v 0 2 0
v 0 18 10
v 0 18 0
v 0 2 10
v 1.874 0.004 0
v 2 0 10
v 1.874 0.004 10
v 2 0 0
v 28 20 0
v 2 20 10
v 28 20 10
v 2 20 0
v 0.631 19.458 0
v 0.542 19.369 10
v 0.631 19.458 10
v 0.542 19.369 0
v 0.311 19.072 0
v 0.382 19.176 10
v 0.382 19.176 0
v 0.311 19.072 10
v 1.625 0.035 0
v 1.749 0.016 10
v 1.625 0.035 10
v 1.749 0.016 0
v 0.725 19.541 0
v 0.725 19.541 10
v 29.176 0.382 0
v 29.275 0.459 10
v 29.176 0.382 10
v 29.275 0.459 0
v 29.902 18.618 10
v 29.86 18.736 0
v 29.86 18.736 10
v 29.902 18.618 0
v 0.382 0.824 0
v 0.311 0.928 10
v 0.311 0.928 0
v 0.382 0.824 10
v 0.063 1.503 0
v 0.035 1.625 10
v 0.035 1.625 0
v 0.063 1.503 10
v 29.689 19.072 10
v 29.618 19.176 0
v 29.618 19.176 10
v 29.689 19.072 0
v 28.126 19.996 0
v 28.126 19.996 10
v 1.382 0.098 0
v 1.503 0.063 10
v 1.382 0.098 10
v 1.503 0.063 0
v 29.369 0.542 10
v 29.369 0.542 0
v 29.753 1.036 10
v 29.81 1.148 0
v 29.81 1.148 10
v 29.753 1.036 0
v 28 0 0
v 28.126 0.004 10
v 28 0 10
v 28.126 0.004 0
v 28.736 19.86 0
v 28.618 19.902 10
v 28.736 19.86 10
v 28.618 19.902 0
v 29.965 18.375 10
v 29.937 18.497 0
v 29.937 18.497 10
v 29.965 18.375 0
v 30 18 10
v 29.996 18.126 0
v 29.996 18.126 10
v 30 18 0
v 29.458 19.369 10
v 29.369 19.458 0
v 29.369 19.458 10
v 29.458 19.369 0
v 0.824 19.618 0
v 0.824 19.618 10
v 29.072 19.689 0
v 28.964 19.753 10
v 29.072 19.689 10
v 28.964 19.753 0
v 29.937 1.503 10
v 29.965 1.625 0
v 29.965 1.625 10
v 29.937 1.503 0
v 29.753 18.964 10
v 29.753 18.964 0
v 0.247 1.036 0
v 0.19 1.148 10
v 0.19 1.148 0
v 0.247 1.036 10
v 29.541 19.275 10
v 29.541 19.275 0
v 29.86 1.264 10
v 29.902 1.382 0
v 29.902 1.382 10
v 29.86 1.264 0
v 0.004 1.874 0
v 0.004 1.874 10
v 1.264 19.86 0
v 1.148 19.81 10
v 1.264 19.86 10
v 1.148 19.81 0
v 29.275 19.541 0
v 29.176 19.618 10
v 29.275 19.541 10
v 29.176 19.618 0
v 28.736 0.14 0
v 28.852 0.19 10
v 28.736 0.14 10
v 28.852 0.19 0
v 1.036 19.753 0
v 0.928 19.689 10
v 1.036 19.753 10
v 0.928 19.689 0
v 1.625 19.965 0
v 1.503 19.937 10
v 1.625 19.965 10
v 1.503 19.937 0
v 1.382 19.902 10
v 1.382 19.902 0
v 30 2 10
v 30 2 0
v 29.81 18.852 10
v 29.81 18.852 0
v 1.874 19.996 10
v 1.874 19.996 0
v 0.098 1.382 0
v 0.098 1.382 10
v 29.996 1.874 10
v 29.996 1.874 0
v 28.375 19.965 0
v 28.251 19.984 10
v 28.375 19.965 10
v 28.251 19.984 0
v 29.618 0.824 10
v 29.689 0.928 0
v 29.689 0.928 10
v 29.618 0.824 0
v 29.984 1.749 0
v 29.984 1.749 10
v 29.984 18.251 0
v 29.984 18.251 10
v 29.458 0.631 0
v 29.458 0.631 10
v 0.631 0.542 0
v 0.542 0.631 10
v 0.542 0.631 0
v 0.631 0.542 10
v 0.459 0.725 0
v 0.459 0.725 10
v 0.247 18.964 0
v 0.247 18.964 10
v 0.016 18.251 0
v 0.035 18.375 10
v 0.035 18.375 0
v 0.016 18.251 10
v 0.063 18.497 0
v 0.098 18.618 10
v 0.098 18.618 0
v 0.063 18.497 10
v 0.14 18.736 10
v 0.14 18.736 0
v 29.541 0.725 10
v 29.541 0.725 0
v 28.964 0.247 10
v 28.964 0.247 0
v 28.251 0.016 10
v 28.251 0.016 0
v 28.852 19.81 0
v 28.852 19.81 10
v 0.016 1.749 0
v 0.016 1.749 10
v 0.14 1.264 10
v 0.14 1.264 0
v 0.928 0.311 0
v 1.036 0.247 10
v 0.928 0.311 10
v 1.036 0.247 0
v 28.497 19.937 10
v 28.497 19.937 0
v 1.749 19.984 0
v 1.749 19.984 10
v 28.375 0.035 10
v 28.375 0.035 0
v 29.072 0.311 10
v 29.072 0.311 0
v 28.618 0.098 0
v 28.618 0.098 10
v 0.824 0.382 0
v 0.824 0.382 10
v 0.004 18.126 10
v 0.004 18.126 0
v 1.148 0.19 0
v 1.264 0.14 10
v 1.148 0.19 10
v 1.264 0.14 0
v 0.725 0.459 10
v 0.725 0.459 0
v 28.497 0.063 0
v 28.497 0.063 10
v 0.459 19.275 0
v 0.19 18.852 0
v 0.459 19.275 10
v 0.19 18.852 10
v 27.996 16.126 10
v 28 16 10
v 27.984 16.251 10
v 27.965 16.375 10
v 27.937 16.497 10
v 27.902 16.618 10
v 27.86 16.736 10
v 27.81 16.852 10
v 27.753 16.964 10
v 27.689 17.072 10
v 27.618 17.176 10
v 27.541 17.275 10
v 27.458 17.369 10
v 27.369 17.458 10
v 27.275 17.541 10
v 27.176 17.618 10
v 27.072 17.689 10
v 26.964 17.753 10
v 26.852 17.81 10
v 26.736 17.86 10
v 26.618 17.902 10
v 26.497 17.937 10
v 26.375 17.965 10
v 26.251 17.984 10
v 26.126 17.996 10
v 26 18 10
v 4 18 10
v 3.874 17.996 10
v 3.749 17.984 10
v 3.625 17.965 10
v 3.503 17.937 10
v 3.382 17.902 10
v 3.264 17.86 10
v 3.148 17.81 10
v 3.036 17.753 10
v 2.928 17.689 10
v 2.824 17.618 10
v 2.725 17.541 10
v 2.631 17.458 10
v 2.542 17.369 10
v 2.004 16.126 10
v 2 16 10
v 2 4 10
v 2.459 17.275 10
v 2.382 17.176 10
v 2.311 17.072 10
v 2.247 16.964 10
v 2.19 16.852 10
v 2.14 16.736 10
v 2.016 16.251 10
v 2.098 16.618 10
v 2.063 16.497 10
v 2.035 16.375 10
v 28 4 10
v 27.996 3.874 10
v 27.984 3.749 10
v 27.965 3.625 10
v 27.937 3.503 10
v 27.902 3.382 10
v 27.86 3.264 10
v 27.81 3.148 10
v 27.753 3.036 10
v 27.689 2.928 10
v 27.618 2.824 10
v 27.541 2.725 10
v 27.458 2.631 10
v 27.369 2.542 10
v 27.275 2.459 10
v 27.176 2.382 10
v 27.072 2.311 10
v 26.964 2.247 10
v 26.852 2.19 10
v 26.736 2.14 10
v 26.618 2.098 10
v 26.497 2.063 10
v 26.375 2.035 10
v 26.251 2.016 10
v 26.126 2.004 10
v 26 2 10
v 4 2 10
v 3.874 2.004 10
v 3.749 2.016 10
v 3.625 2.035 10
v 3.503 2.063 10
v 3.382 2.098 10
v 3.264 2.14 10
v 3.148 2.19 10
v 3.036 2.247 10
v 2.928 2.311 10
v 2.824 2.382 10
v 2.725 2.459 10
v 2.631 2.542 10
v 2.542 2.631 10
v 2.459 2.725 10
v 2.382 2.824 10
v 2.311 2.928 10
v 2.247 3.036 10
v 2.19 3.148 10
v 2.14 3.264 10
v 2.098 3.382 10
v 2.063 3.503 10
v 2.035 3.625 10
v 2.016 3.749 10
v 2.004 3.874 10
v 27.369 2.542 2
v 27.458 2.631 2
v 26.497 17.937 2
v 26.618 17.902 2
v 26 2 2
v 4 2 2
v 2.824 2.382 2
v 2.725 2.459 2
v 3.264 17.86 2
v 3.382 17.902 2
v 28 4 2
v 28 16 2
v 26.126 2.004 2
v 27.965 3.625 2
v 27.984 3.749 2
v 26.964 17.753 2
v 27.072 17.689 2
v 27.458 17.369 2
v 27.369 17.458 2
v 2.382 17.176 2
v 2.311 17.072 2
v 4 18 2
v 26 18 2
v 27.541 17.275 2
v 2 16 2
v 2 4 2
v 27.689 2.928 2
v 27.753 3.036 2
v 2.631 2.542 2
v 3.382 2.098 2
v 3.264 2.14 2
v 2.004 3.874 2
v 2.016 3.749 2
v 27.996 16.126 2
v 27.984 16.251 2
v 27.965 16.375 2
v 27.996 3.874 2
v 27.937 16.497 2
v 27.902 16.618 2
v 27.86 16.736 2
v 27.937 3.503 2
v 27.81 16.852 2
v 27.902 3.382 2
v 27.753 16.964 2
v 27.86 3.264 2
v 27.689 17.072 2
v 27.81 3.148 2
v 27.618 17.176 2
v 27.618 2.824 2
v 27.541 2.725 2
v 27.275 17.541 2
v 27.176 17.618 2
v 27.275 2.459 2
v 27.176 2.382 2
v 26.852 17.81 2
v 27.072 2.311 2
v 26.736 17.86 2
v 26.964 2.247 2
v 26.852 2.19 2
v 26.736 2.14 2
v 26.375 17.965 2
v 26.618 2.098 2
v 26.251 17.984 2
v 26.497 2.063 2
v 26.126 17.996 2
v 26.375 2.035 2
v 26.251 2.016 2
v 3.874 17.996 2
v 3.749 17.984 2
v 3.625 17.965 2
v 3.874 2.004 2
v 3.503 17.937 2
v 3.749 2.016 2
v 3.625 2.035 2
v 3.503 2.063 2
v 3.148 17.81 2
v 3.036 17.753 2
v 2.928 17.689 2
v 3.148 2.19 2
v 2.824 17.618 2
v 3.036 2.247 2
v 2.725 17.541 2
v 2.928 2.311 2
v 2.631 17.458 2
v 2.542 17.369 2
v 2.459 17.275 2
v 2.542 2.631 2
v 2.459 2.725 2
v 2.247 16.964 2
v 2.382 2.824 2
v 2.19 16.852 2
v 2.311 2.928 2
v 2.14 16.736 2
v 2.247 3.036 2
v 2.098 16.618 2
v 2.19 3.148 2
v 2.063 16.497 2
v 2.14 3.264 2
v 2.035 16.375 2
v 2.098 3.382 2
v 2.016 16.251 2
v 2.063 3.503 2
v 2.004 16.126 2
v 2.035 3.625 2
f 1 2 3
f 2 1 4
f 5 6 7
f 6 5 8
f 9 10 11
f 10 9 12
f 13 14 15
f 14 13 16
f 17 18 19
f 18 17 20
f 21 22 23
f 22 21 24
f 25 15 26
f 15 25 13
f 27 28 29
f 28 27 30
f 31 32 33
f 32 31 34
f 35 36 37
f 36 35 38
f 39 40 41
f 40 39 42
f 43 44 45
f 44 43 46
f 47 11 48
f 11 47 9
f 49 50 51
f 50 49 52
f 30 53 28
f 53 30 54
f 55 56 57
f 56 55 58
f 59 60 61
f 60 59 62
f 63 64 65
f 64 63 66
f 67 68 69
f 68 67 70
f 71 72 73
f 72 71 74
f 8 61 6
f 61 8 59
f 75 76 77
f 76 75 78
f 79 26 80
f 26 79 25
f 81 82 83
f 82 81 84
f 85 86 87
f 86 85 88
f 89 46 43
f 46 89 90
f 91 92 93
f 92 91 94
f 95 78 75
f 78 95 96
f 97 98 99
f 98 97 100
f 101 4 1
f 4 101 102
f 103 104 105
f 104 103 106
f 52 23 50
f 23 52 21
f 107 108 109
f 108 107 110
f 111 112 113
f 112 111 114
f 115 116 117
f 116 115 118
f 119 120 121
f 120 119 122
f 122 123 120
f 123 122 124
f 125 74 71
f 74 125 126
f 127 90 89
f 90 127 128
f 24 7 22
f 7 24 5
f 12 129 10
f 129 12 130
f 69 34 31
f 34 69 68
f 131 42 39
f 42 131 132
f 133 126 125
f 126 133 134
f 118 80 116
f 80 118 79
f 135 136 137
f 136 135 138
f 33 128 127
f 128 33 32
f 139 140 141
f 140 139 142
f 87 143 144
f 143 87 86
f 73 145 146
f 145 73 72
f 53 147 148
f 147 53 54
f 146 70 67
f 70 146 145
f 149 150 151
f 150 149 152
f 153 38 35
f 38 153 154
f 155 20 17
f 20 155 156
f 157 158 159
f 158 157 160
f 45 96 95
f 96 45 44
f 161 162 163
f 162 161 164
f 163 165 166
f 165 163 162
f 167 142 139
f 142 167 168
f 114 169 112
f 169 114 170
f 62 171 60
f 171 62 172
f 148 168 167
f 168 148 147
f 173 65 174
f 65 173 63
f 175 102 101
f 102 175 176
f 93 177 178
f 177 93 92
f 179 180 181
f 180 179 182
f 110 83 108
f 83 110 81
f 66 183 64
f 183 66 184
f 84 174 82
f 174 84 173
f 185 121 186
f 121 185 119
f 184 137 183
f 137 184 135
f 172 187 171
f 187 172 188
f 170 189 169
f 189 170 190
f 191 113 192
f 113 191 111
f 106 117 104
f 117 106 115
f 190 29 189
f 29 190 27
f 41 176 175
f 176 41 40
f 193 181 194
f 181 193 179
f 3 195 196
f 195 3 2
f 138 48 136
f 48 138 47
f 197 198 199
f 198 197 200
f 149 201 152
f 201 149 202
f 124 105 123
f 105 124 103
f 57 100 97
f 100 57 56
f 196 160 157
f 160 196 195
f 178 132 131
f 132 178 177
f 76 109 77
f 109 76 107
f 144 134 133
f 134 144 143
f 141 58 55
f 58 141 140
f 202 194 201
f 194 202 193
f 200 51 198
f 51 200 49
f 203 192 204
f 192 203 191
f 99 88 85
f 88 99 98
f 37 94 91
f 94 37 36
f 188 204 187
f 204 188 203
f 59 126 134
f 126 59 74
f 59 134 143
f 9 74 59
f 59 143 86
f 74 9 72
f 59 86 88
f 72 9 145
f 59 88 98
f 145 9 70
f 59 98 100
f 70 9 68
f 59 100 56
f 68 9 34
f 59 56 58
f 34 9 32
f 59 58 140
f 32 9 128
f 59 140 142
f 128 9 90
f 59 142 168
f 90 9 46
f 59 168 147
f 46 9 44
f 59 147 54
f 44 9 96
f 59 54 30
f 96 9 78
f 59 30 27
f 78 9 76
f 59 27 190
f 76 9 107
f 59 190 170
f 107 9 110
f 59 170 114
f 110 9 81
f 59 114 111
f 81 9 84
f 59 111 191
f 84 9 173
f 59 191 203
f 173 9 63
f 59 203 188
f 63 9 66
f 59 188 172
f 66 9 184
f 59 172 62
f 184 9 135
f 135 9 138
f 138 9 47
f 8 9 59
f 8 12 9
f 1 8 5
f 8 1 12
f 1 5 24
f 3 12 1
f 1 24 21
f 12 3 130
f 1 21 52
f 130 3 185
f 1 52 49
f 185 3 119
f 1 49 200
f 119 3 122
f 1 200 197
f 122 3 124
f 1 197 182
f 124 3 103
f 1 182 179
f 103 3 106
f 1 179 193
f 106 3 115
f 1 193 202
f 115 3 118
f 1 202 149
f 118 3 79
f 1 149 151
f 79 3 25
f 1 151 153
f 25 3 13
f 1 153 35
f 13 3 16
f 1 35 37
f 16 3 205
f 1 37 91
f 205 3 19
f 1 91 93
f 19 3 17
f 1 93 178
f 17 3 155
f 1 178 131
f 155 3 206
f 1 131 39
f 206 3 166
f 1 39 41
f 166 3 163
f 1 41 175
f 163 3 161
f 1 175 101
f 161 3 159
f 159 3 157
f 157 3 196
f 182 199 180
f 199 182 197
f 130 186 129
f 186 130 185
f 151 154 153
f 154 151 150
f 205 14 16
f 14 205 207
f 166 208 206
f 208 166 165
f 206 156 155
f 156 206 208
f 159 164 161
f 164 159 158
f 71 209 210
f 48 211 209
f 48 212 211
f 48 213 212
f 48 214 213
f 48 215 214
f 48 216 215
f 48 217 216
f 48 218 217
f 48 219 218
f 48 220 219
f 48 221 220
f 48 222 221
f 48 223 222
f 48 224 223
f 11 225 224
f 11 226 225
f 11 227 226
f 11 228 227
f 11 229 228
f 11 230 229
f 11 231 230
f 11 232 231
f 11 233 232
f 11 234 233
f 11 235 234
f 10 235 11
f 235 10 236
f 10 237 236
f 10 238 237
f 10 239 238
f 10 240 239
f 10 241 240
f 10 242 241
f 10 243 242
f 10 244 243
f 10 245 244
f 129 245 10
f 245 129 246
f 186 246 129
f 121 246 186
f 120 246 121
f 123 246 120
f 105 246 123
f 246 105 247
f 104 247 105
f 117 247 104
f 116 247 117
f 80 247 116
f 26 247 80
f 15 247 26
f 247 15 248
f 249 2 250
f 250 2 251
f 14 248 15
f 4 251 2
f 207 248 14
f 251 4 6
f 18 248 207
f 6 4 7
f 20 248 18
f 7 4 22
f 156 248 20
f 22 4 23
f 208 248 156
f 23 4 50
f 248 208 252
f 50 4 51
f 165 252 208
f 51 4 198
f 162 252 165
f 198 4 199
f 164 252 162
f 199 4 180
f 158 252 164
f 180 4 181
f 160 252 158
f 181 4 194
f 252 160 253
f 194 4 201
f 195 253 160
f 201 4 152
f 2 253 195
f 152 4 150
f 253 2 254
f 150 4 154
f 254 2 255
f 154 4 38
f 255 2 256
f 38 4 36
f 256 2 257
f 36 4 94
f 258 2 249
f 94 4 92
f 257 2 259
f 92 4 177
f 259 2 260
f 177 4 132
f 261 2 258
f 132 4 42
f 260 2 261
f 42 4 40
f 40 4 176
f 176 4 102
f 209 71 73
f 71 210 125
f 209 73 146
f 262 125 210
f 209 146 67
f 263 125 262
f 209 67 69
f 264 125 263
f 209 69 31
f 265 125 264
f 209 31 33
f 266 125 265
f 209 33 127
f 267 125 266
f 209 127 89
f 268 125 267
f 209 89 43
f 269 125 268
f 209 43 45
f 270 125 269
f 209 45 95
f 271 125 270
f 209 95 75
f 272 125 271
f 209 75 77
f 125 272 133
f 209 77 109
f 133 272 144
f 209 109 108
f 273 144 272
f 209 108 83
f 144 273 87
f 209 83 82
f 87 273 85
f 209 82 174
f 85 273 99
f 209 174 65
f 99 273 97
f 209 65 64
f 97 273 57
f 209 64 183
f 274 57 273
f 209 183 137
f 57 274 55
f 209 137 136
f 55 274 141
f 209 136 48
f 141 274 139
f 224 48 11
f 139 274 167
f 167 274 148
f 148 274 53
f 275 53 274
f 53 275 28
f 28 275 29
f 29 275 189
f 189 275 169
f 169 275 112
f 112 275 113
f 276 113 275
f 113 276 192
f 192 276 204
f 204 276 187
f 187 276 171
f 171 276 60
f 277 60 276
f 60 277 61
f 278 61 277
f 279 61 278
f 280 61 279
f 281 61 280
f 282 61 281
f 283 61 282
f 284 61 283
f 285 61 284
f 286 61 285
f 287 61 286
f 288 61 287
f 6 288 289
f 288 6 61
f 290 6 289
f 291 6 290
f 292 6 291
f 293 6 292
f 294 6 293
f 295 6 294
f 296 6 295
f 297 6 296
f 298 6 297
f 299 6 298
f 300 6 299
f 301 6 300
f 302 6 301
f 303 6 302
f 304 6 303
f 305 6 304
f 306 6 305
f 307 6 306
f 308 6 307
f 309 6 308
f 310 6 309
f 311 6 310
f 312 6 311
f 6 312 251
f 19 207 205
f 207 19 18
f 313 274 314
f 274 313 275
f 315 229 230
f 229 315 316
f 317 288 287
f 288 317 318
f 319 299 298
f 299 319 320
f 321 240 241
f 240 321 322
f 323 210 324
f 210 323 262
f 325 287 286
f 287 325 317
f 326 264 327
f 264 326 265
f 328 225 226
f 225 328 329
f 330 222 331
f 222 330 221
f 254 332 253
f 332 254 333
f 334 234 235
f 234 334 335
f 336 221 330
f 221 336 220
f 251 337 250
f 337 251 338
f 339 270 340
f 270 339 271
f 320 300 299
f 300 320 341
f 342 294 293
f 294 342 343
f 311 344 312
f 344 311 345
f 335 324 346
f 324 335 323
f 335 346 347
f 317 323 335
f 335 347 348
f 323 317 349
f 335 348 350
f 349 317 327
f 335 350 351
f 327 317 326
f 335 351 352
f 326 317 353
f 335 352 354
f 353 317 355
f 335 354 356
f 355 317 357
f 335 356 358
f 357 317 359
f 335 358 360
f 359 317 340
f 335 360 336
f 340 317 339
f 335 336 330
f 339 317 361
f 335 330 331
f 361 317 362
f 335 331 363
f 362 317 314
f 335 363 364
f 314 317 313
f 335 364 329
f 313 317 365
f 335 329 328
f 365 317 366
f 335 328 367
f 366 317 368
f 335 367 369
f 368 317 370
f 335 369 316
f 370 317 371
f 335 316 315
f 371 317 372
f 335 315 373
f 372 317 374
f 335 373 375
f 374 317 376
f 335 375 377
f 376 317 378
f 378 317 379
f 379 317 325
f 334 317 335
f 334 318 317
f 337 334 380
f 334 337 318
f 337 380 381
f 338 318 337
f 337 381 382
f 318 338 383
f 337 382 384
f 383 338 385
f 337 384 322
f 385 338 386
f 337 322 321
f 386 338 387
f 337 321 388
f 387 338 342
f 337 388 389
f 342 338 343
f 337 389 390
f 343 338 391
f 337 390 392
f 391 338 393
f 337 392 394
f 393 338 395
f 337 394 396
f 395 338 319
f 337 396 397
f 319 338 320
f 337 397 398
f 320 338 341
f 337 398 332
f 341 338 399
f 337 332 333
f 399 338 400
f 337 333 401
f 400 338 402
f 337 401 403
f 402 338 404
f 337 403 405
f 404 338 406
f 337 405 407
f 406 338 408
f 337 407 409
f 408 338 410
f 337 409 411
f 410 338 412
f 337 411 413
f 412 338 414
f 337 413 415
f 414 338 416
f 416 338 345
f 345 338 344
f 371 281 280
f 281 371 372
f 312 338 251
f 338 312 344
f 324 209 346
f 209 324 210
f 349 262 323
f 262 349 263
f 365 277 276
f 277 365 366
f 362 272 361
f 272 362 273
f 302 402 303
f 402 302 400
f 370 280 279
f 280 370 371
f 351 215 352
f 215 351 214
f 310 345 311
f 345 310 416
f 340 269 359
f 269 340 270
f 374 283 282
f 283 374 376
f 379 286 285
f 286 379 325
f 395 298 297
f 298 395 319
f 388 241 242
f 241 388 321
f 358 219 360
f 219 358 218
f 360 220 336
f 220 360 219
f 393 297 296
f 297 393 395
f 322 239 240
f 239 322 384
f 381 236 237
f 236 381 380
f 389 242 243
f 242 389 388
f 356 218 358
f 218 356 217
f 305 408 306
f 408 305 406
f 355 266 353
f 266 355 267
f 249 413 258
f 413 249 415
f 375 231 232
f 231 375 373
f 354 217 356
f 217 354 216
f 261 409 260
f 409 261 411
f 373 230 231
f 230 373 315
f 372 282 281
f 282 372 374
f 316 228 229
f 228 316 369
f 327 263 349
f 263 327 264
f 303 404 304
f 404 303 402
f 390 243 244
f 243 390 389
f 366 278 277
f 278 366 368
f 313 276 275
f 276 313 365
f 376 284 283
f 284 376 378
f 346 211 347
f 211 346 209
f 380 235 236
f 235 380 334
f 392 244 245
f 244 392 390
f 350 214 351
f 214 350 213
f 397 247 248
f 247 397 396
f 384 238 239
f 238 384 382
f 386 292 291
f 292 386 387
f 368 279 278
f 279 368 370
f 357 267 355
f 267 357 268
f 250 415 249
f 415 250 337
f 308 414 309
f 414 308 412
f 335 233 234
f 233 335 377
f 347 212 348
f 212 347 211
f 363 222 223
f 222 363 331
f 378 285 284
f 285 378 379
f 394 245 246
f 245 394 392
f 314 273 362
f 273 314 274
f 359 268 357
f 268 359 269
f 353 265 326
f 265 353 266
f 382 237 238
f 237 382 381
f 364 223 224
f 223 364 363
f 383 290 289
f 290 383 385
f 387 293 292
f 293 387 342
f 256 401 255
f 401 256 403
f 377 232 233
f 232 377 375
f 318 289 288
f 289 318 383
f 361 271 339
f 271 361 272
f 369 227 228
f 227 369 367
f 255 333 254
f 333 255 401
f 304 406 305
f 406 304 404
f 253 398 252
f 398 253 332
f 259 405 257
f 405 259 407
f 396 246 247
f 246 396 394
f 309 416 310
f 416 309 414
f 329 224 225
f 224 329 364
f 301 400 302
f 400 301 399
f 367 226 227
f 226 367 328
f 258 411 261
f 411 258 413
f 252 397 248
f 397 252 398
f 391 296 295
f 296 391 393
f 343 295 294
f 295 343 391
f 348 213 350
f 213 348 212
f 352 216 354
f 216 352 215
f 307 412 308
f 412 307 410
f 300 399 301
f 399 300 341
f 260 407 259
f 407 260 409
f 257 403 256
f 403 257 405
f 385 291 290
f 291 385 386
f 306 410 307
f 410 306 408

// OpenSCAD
module _rounded_box(dim, r)
{
  //%cube(dim);
  hull()
  {
    for(dx=[r, dim[0]-r])
      for(dy=[r, dim[1]-r])
        translate([dx, dy, 0])
          cylinder(r=r, h=dim[2], $fn=100);
  }
}


module minibox(dim, r, wall)
{
  difference()
  {
    _rounded_box(dim, r);
    translate(wall*[1,1,1])
      _rounded_box(dim-2*wall*[1,1,0], r);
  }
}


minibox([30, 20, 10], 2, 2);
